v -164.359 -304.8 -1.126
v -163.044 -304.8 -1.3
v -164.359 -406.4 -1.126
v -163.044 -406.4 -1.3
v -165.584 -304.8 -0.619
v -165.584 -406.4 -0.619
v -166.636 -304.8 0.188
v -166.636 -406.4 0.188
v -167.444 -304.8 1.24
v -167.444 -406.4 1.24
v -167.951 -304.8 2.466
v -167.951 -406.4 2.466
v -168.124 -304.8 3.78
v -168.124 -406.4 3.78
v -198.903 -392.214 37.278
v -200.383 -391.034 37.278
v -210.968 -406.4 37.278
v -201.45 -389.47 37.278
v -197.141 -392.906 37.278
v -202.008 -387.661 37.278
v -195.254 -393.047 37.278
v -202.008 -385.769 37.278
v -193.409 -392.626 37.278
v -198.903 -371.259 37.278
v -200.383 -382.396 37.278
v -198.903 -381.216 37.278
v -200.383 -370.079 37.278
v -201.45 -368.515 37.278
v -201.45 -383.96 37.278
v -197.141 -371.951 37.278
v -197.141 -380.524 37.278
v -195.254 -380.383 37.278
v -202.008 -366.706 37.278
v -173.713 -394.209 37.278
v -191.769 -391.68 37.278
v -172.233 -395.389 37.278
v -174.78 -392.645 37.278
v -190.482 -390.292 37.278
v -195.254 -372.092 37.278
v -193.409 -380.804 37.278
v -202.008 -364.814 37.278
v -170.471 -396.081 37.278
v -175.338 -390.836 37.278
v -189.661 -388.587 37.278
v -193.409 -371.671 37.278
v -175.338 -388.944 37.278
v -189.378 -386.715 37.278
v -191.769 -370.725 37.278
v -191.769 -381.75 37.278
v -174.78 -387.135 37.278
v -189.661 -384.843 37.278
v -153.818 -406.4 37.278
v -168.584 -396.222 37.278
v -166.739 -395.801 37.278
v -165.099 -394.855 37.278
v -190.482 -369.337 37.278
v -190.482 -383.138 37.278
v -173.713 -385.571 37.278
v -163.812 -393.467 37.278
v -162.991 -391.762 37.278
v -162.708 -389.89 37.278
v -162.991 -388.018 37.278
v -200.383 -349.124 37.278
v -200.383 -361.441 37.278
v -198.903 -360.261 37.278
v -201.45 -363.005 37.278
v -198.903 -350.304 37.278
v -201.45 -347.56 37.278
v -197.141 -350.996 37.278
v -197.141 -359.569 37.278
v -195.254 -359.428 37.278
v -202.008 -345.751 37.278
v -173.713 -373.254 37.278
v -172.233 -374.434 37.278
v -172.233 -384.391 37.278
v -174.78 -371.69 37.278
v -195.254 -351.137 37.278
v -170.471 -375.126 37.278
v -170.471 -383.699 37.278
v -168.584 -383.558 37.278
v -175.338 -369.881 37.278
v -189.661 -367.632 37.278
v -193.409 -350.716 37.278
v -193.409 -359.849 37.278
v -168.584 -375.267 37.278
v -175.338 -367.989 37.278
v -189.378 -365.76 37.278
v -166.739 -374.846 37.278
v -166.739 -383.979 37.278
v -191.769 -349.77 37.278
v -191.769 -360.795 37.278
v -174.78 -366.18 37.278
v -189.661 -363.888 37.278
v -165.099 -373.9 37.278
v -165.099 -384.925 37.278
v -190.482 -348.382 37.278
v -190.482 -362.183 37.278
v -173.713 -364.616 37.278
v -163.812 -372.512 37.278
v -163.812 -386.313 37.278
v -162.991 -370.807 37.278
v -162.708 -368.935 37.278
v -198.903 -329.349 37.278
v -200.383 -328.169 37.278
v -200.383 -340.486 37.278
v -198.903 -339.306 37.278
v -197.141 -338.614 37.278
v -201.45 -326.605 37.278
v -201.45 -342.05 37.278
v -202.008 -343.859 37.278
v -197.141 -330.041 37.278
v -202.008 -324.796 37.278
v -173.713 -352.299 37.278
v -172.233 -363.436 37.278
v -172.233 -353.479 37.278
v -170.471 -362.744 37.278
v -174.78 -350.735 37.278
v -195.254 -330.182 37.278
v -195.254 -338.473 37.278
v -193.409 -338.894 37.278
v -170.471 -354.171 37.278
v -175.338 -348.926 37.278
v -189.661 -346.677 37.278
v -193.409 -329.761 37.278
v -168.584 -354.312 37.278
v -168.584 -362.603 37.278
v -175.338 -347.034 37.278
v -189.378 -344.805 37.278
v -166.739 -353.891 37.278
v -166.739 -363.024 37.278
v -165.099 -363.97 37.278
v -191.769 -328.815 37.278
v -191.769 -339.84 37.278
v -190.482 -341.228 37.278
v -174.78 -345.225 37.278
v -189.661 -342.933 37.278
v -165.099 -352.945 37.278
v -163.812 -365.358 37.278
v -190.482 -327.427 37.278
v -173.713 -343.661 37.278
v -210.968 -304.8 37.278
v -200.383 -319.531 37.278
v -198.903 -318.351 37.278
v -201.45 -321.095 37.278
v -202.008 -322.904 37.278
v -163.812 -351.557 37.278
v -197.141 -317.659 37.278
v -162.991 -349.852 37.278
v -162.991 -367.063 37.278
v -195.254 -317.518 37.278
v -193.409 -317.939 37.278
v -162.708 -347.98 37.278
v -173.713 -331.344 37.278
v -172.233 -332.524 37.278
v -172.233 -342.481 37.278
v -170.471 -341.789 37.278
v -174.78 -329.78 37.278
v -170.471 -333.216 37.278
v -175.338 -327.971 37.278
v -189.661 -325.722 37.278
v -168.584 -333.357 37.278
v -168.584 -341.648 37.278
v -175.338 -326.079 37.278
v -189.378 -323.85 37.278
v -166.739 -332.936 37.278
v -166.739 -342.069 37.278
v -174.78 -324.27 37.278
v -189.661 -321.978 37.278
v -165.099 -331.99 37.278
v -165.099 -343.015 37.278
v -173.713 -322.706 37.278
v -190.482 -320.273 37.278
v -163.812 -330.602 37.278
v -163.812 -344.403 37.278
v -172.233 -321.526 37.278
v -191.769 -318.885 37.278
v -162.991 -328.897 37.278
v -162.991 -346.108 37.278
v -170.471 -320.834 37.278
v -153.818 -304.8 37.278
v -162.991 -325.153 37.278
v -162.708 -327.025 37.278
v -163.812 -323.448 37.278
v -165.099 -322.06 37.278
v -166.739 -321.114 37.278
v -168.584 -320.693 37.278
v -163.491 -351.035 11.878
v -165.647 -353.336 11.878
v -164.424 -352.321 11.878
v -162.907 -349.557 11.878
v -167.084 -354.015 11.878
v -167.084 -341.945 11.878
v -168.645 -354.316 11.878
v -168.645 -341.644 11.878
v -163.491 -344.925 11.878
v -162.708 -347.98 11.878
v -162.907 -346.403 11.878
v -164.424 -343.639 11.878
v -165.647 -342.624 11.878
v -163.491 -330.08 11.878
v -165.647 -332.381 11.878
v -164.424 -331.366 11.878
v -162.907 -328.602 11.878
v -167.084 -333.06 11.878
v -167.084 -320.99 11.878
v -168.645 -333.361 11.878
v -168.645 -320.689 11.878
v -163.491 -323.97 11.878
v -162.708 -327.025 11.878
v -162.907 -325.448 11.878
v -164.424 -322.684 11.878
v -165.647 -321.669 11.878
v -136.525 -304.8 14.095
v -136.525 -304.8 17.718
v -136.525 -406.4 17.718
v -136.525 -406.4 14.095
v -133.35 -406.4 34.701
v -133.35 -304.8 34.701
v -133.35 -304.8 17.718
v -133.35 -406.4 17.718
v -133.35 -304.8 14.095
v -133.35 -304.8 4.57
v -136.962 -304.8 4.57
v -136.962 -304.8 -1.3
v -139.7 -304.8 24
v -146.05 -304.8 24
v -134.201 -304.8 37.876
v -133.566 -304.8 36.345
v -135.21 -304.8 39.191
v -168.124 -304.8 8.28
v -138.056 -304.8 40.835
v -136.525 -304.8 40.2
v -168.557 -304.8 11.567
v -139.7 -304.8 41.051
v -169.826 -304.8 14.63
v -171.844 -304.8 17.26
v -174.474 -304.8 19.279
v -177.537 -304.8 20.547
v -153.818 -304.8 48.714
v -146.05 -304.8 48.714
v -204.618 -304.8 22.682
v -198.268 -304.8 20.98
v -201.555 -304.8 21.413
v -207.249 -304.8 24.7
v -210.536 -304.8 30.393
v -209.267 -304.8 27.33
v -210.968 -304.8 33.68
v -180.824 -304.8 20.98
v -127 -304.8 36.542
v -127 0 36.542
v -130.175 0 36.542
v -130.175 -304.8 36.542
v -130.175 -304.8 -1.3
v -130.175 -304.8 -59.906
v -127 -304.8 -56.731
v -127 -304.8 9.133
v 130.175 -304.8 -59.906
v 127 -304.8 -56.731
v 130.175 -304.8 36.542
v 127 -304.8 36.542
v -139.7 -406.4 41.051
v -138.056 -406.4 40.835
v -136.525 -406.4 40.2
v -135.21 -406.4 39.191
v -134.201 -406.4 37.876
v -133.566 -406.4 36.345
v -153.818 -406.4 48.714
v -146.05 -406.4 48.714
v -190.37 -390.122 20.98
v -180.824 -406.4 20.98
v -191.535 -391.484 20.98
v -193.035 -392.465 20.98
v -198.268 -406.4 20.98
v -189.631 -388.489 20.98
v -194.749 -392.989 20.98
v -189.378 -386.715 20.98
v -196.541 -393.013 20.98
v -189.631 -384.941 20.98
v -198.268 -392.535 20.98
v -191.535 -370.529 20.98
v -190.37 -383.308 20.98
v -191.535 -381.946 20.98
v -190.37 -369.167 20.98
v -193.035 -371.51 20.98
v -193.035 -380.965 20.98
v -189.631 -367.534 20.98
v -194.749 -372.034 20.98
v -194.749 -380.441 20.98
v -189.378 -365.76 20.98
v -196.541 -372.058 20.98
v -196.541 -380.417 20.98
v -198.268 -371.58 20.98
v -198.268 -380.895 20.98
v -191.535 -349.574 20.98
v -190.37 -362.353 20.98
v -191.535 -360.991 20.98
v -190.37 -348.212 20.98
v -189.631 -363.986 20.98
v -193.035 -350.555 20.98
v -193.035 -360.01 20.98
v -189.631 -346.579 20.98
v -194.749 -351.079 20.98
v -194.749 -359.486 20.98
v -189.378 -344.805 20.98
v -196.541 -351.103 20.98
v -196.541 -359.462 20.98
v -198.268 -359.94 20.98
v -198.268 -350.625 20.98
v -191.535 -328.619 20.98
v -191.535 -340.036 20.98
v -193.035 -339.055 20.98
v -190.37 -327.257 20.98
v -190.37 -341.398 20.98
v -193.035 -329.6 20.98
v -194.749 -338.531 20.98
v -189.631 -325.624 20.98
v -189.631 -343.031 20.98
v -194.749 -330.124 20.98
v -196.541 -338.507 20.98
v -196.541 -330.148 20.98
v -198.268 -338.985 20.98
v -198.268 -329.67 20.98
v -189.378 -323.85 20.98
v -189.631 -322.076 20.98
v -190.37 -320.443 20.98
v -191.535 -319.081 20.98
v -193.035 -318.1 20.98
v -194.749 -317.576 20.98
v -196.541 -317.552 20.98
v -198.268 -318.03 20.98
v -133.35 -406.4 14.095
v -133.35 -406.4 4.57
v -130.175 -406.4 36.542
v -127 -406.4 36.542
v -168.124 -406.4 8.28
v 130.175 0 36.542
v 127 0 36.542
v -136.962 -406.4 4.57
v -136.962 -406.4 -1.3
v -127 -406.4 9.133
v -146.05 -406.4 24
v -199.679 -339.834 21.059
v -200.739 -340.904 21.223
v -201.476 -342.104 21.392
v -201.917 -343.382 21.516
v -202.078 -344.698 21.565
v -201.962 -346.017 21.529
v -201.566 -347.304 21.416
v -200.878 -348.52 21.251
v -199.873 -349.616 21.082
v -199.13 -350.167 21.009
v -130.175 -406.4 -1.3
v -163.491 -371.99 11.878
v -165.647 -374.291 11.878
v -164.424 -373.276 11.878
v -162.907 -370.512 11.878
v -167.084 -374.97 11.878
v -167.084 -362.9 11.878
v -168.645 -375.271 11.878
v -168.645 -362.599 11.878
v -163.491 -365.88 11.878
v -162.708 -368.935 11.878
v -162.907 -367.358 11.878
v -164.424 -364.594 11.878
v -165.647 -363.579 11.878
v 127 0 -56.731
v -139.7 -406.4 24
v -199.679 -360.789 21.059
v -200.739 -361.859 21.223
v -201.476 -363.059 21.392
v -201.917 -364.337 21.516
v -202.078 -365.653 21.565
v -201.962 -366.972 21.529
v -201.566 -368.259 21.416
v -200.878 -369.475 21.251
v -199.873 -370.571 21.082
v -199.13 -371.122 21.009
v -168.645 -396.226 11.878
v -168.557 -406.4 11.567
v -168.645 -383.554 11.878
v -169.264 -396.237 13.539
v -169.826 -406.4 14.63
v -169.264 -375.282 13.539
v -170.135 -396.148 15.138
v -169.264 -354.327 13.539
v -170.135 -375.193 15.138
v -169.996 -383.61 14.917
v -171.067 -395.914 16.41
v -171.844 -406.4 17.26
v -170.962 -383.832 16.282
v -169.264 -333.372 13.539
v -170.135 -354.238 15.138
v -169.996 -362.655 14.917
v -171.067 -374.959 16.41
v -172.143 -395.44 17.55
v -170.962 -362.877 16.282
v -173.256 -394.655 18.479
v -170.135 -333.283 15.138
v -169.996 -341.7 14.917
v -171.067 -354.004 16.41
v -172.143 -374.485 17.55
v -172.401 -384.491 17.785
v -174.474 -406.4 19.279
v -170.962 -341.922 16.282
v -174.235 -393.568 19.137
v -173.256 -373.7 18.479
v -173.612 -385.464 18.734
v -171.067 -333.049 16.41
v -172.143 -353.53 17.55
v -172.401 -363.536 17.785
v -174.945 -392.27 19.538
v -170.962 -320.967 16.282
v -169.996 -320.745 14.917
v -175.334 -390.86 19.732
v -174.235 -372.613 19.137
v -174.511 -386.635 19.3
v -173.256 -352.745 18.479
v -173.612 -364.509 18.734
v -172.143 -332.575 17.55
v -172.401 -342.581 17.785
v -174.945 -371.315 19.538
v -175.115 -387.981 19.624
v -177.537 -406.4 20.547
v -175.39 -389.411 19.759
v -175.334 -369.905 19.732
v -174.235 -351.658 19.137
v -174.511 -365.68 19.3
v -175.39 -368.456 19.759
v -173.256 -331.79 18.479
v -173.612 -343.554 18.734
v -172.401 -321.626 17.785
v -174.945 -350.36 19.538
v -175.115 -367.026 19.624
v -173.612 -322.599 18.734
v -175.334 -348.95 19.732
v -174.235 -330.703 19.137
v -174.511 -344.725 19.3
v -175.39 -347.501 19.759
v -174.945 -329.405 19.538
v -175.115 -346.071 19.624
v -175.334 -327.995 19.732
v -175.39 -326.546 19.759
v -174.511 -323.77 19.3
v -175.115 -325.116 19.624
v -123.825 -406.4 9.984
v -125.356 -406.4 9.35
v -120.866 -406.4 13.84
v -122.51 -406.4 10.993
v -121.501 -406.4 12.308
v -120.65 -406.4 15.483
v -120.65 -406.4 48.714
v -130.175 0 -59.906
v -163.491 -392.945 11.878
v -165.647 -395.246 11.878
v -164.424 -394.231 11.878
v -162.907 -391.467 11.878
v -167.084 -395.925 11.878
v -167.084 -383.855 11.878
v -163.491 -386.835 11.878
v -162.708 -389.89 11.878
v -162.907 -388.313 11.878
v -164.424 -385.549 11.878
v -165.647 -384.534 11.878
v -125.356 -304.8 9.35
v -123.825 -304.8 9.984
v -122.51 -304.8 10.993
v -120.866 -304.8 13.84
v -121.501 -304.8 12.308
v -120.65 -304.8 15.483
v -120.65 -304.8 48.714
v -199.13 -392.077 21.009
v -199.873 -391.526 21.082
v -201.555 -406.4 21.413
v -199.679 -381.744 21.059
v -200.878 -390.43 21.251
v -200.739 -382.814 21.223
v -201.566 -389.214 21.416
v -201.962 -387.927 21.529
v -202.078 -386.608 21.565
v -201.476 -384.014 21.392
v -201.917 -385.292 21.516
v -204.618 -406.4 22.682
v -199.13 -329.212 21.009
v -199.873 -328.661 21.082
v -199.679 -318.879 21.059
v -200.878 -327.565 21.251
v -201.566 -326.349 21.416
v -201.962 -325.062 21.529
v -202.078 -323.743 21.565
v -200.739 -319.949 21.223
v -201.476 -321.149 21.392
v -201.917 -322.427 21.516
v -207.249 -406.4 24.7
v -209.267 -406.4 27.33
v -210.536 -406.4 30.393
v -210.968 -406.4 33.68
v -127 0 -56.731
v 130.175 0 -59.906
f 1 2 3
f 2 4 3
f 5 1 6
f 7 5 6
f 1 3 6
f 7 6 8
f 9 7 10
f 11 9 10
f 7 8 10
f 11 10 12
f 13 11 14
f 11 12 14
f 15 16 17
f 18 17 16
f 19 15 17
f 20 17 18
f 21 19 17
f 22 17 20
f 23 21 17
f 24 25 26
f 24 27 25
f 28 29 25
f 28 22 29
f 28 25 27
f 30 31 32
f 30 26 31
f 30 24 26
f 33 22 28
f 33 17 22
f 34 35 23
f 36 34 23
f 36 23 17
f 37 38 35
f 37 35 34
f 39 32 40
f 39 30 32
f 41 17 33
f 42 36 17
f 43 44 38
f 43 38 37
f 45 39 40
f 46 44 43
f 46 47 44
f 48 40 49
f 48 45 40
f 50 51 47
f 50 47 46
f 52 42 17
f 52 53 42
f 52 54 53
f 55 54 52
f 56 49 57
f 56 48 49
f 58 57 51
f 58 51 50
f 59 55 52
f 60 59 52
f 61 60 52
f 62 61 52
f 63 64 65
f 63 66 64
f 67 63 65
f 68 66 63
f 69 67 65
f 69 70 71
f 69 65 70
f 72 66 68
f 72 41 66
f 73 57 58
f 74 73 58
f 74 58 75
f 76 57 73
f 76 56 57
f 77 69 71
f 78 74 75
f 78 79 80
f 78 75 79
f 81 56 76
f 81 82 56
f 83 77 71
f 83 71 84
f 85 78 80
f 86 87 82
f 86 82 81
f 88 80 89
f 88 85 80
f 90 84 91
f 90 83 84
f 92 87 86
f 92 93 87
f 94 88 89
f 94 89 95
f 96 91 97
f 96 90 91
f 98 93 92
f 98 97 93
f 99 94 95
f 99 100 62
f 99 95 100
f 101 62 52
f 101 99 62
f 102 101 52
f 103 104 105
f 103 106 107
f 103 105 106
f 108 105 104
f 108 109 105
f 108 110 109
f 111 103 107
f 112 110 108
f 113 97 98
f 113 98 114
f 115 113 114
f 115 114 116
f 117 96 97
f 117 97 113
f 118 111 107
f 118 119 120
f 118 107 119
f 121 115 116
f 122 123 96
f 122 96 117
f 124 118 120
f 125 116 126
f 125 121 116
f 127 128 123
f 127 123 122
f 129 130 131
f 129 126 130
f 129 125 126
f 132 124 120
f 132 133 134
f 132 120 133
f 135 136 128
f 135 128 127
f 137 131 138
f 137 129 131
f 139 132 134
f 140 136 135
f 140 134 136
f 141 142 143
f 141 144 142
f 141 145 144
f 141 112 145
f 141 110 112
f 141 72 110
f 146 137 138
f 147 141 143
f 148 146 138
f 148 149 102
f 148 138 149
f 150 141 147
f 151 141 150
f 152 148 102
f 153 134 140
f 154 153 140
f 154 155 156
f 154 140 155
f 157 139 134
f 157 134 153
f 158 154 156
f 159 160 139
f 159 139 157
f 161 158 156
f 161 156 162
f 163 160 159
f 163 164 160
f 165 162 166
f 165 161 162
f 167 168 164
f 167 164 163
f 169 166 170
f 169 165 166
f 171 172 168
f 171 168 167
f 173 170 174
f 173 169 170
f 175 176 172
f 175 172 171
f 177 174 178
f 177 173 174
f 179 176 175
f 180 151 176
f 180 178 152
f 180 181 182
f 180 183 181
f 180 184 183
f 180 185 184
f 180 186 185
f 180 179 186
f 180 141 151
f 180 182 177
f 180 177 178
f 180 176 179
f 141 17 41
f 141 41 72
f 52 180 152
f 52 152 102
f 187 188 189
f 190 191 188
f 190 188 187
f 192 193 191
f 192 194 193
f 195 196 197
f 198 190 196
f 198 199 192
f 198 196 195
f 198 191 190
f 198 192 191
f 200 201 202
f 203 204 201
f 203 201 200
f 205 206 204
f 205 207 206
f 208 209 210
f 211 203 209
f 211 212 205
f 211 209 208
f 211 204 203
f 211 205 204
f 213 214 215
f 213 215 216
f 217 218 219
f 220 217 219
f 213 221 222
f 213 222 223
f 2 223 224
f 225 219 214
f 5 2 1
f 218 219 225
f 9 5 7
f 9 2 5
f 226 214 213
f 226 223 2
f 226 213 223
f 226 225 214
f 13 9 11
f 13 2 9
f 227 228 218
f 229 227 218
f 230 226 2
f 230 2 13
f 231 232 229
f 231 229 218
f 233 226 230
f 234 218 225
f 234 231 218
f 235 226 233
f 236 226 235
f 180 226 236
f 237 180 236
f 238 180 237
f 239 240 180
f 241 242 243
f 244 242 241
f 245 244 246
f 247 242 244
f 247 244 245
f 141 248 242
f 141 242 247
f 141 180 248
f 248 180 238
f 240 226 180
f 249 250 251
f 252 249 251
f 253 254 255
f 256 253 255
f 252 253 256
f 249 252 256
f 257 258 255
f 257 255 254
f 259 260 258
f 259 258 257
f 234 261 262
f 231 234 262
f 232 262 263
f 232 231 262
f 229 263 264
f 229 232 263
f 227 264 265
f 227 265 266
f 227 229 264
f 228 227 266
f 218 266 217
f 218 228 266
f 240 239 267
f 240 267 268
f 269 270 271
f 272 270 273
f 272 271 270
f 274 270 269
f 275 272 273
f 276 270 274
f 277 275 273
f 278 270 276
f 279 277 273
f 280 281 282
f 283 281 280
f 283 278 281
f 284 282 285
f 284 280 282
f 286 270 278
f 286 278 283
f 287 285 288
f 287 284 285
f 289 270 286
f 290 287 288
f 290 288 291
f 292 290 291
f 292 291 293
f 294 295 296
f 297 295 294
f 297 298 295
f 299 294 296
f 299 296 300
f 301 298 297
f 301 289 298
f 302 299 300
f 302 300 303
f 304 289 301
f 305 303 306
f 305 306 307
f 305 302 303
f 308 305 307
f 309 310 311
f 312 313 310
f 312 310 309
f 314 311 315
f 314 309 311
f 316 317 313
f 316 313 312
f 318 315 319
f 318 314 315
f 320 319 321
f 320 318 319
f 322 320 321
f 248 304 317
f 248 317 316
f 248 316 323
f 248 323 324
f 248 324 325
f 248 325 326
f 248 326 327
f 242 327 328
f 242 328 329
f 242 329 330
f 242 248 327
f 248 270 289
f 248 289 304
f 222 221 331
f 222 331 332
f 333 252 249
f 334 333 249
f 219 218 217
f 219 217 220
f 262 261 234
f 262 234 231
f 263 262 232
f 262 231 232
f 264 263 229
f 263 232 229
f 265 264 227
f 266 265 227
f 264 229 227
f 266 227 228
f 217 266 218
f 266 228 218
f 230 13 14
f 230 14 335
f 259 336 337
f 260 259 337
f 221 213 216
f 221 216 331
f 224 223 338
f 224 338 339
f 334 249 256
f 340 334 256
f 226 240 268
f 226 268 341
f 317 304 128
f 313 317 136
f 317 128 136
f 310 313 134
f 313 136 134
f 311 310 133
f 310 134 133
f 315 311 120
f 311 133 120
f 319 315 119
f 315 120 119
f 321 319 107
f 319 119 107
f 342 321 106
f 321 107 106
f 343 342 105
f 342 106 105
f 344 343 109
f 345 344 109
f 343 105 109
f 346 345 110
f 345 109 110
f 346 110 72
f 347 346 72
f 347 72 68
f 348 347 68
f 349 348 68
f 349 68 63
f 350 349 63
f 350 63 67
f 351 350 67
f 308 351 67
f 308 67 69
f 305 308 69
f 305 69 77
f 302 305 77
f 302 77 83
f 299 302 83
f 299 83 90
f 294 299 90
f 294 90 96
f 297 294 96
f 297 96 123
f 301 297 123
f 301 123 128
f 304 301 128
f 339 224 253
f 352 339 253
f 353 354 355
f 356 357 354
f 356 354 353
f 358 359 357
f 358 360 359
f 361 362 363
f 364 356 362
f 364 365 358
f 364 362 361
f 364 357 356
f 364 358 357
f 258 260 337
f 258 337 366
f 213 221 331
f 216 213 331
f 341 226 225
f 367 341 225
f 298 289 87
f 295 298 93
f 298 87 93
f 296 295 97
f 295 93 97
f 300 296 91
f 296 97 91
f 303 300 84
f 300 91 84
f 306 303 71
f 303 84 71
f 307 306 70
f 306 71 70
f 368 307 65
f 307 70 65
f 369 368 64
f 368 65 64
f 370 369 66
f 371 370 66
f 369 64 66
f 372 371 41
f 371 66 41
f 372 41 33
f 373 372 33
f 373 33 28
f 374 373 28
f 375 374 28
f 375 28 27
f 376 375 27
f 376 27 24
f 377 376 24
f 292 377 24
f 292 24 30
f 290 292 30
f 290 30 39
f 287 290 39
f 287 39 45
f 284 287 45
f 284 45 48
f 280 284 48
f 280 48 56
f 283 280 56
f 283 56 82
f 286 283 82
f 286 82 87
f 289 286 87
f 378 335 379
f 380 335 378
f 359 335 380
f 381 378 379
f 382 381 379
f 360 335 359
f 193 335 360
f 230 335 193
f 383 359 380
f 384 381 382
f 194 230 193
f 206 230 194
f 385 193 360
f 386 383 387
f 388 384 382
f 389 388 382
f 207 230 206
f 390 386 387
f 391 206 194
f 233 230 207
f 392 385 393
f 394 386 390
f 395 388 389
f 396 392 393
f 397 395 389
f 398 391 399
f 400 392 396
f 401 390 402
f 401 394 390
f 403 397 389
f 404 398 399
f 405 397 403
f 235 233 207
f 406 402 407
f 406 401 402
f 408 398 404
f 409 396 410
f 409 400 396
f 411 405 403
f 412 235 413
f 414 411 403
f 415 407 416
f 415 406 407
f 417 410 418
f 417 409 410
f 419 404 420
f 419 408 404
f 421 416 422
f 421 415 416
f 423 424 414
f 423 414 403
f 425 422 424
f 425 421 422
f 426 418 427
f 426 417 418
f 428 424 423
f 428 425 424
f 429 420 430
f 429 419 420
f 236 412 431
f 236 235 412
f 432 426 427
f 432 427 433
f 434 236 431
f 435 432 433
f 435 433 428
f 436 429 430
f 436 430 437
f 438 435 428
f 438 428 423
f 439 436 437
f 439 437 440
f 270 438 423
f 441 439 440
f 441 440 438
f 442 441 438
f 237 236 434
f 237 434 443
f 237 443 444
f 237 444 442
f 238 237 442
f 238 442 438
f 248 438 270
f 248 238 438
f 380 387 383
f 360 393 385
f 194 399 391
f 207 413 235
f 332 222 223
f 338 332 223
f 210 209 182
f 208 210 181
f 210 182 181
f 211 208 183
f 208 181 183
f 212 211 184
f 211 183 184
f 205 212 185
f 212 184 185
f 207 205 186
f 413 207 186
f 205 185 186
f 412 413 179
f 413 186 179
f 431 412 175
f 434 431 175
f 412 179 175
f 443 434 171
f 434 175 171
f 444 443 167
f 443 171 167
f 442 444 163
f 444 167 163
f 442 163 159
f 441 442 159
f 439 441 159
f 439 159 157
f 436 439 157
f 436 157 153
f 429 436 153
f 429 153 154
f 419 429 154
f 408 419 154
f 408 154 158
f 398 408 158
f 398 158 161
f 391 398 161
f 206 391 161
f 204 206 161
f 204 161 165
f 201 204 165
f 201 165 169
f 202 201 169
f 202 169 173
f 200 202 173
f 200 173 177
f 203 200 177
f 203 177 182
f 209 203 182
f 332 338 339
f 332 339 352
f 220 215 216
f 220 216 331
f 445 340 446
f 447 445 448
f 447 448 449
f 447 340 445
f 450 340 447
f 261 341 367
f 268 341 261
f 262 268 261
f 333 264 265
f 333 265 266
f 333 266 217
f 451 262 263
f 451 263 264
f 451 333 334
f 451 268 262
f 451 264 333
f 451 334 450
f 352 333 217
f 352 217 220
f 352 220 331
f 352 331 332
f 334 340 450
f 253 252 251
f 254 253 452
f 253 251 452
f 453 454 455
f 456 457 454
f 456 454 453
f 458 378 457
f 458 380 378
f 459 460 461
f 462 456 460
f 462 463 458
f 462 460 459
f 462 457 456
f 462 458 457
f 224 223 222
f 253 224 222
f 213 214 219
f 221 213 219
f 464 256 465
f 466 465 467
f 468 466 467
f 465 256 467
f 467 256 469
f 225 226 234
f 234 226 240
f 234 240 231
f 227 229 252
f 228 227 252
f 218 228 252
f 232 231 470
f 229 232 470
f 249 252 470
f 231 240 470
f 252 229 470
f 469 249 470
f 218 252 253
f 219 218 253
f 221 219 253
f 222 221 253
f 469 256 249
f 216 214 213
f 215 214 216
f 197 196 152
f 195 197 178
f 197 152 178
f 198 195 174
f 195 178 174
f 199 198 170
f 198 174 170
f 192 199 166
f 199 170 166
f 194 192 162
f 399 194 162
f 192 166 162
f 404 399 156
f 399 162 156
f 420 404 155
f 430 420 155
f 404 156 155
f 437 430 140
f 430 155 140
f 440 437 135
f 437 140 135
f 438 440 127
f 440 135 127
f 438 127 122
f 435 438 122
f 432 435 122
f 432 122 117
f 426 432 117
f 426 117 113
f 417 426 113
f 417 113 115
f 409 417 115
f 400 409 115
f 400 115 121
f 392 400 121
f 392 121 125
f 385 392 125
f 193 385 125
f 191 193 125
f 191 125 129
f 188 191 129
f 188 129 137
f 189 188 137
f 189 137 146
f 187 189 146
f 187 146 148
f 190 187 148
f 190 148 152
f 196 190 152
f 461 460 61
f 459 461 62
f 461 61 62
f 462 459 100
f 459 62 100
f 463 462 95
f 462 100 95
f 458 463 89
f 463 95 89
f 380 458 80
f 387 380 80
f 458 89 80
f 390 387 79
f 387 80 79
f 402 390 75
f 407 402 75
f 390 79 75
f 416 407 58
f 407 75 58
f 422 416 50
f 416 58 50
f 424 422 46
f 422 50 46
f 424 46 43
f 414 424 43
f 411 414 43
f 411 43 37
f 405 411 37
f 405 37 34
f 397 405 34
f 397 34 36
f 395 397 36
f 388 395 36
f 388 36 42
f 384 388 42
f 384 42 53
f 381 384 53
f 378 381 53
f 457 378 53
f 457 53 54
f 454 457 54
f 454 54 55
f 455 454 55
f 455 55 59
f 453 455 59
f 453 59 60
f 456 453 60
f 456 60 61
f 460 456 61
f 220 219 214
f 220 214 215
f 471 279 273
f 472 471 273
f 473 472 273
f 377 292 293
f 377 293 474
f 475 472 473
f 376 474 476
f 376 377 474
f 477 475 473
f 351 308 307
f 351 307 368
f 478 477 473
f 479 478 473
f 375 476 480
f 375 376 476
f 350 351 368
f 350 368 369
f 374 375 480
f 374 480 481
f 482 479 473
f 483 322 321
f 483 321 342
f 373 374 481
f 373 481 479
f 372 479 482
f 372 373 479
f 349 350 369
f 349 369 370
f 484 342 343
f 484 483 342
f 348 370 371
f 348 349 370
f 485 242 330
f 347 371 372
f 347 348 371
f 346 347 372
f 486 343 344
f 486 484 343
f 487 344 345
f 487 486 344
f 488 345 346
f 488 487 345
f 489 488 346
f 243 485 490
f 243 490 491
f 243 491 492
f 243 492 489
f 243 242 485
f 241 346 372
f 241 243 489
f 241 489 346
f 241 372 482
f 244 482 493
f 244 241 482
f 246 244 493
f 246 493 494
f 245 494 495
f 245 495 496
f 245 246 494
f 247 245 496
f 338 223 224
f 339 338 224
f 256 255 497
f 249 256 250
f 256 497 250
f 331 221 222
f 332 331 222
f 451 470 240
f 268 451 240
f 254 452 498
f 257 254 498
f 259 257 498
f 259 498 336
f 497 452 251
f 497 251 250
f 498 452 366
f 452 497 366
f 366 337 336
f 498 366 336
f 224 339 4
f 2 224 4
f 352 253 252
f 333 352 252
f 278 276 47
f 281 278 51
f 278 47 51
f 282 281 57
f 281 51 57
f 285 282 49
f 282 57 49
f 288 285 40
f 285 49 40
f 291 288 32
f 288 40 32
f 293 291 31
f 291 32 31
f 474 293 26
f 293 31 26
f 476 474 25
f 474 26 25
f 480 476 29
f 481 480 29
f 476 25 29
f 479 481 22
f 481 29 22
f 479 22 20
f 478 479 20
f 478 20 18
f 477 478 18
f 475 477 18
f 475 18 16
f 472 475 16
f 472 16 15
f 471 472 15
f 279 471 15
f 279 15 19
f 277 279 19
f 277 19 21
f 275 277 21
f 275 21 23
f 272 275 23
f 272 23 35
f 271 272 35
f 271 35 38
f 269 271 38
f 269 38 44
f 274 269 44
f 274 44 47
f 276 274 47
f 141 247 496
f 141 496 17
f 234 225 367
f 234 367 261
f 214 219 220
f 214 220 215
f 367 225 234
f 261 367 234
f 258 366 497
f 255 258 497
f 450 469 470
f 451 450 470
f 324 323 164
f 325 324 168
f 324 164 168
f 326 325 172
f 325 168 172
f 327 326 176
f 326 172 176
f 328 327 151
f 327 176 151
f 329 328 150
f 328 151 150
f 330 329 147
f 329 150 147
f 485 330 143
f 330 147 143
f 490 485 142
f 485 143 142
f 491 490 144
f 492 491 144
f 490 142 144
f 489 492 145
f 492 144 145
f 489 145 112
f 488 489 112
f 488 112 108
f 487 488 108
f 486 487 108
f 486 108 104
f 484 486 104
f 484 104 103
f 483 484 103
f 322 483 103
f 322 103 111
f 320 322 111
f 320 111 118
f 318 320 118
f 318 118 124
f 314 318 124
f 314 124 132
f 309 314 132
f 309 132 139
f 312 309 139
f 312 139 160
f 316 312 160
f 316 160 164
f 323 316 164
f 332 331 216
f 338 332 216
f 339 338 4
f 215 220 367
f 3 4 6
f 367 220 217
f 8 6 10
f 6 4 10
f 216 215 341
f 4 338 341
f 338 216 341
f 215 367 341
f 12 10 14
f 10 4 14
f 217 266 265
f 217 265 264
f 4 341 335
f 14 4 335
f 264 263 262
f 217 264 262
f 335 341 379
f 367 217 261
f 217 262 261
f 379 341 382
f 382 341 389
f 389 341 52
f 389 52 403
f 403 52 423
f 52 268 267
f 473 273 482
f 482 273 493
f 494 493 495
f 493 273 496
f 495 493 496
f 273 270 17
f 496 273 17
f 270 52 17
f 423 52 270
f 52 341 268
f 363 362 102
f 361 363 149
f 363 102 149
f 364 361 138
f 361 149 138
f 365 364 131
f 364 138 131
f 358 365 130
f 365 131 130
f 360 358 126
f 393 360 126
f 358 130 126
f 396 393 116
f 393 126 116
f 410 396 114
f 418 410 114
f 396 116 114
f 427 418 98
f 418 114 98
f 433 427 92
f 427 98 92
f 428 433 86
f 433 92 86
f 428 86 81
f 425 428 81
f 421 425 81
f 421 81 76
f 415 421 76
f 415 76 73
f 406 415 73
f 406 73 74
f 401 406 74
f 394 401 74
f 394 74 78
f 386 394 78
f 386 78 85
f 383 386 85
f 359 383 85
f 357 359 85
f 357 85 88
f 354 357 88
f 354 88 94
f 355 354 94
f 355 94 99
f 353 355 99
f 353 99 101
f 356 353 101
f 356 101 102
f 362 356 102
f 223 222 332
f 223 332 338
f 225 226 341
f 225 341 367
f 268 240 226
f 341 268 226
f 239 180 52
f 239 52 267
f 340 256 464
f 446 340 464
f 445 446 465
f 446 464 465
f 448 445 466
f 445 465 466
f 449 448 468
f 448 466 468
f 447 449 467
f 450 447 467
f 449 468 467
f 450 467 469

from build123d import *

# Parameters (mm, degrees)
F1_DEPTH = 304.8
F3_DEPTH = 101.6
F4_W     = 101.6
F4_H     = 3.623174
F5_DEPTH = 3.175
F7_DEPTH = 101.6
F8_R     = 6.35
F9_DEPTH = 25.4
F10_R    = 5.08


with BuildPart() as f1:
    # F0 (on Front) → F1 (new body)
    with BuildSketch(Plane.XZ):
        Polygon((-127, 36.542452), (-130.175, 36.542452), (-130.175, -59.905658), (0, -59.905658), (130.175, -59.905658), (130.175, 36.542452), (127, 36.542452), (127, -56.730658), (0, -56.730658), (-127, -56.730658), align=None)
    extrude(amount=F1_DEPTH)

    # F2 (on face) → F3 (join)
    with BuildSketch(Plane.XZ.offset(304.8)):
        with BuildLine():
            ThreePointArc((-127, 9.133371), (-122.509872, 10.993243), (-120.65, 15.483371))
            Line((-120.65, 15.483371), (-120.65, 48.713591))
            Line((-120.65, 48.713591), (-146.05, 48.713591))
            Line((-146.05, 48.713591), (-146.05, 23.999967))
            Line((-146.05, 23.999967), (-139.7, 23.999967))
            Line((-139.7, 23.999967), (-139.7, 41.051134))
            ThreePointArc((-139.7, 41.051134), (-135.209872, 39.191263), (-133.35, 34.701134))
            Line((-133.35, 34.701134), (-133.35, 4.570095))
            Line((-133.35, 4.570095), (-136.962131, 4.570095))
            Line((-136.962131, 4.570095), (-136.962131, -1.299595))
            Line((-136.962131, -1.299595), (-130.175, -1.299595))
            Line((-130.175, -1.299595), (-130.175, 36.542452))
            Line((-130.175, 36.542452), (-127, 36.542452))
            Line((-127, 36.542452), (-127, 9.133371))
        make_face()
    extrude(amount=F3_DEPTH)

    # F4 (on face) → F5 (join)
    with BuildSketch(Plane(origin=(-133.35, 0, 0), x_dir=(0, -1, 0), z_dir=(-1, 0, 0))):
        with Locations((355.6, 15.906682)):
            Rectangle(F4_W, F4_H)
    extrude(amount=F5_DEPTH)


with BuildPart() as f7:
    # F6 (on face) → F7 (new body)
    with BuildSketch(Plane(origin=(0, -304.8, 0), x_dir=(-1, 0, 0), z_dir=(0, 1, 0))):
        with BuildLine():
            Line((146.05, 23.999967), (139.7, 23.999967))
            Line((139.7, 23.999967), (139.7, 41.051134))
            ThreePointArc((139.7, 41.051134), (135.209872, 39.191263), (133.35, 34.701134))
            Line((133.35, 34.701134), (133.35, 17.718269))
            Line((133.35, 17.718269), (136.525, 17.718269))
            Line((136.525, 17.718269), (136.525, 14.095095))
            Line((136.525, 14.095095), (133.35, 14.095095))
            Line((133.35, 14.095095), (133.35, 4.570095))
            Line((133.35, 4.570095), (136.962131, 4.570095))
            Line((136.962131, 4.570095), (136.962131, -1.299595))
            Line((136.962131, -1.299595), (168.124224, -1.299595))
            Line((168.124224, -1.299595), (168.124224, 8.280211))
            ThreePointArc((168.124224, 8.280211), (171.843968, 17.260467), (180.824224, 20.980211))
            Line((180.824224, 20.980211), (198.268429, 20.980211))
            ThreePointArc((198.268429, 20.980211), (207.248685, 24.699955), (210.968429, 33.680211))
            Line((210.968429, 33.680211), (210.968429, 37.278183))
            Line((210.968429, 37.278183), (153.818429, 37.278183))
            Line((153.818429, 37.278183), (153.818429, 48.713591))
            Line((153.818429, 48.713591), (146.05, 48.713591))
            Line((146.05, 48.713591), (146.05, 23.999967))
        make_face()
    extrude(amount=-F7_DEPTH)

    # F8 (on face) → F9 (cut)
    with BuildSketch(Plane.XY.offset(37.278183)):
        with Locations((-195.728429, -323.85)):
            Circle(F8_R)
        with Locations((-195.728429, -344.805)):
            Circle(F8_R)
        with Locations((-195.728429, -365.76)):
            Circle(F8_R)
        with Locations((-195.728429, -386.715)):
            Circle(F8_R)
        with Locations((-169.058429, -327.025)):
            Circle(F8_R)
        with Locations((-169.058429, -347.98)):
            Circle(F8_R)
        with Locations((-169.058429, -368.935)):
            Circle(F8_R)
        with Locations((-169.058429, -389.89)):
            Circle(F8_R)
    extrude(amount=-F9_DEPTH, mode=Mode.SUBTRACT)

    # F10
    f10_edges = [f7.edges().sort_by_distance(p)[0] for p in [
        (-168.124224, -355.6, -1.299595),
    ]]
    fillet(f10_edges, radius=F10_R)


solid = Compound([f1.part, f7.part])
